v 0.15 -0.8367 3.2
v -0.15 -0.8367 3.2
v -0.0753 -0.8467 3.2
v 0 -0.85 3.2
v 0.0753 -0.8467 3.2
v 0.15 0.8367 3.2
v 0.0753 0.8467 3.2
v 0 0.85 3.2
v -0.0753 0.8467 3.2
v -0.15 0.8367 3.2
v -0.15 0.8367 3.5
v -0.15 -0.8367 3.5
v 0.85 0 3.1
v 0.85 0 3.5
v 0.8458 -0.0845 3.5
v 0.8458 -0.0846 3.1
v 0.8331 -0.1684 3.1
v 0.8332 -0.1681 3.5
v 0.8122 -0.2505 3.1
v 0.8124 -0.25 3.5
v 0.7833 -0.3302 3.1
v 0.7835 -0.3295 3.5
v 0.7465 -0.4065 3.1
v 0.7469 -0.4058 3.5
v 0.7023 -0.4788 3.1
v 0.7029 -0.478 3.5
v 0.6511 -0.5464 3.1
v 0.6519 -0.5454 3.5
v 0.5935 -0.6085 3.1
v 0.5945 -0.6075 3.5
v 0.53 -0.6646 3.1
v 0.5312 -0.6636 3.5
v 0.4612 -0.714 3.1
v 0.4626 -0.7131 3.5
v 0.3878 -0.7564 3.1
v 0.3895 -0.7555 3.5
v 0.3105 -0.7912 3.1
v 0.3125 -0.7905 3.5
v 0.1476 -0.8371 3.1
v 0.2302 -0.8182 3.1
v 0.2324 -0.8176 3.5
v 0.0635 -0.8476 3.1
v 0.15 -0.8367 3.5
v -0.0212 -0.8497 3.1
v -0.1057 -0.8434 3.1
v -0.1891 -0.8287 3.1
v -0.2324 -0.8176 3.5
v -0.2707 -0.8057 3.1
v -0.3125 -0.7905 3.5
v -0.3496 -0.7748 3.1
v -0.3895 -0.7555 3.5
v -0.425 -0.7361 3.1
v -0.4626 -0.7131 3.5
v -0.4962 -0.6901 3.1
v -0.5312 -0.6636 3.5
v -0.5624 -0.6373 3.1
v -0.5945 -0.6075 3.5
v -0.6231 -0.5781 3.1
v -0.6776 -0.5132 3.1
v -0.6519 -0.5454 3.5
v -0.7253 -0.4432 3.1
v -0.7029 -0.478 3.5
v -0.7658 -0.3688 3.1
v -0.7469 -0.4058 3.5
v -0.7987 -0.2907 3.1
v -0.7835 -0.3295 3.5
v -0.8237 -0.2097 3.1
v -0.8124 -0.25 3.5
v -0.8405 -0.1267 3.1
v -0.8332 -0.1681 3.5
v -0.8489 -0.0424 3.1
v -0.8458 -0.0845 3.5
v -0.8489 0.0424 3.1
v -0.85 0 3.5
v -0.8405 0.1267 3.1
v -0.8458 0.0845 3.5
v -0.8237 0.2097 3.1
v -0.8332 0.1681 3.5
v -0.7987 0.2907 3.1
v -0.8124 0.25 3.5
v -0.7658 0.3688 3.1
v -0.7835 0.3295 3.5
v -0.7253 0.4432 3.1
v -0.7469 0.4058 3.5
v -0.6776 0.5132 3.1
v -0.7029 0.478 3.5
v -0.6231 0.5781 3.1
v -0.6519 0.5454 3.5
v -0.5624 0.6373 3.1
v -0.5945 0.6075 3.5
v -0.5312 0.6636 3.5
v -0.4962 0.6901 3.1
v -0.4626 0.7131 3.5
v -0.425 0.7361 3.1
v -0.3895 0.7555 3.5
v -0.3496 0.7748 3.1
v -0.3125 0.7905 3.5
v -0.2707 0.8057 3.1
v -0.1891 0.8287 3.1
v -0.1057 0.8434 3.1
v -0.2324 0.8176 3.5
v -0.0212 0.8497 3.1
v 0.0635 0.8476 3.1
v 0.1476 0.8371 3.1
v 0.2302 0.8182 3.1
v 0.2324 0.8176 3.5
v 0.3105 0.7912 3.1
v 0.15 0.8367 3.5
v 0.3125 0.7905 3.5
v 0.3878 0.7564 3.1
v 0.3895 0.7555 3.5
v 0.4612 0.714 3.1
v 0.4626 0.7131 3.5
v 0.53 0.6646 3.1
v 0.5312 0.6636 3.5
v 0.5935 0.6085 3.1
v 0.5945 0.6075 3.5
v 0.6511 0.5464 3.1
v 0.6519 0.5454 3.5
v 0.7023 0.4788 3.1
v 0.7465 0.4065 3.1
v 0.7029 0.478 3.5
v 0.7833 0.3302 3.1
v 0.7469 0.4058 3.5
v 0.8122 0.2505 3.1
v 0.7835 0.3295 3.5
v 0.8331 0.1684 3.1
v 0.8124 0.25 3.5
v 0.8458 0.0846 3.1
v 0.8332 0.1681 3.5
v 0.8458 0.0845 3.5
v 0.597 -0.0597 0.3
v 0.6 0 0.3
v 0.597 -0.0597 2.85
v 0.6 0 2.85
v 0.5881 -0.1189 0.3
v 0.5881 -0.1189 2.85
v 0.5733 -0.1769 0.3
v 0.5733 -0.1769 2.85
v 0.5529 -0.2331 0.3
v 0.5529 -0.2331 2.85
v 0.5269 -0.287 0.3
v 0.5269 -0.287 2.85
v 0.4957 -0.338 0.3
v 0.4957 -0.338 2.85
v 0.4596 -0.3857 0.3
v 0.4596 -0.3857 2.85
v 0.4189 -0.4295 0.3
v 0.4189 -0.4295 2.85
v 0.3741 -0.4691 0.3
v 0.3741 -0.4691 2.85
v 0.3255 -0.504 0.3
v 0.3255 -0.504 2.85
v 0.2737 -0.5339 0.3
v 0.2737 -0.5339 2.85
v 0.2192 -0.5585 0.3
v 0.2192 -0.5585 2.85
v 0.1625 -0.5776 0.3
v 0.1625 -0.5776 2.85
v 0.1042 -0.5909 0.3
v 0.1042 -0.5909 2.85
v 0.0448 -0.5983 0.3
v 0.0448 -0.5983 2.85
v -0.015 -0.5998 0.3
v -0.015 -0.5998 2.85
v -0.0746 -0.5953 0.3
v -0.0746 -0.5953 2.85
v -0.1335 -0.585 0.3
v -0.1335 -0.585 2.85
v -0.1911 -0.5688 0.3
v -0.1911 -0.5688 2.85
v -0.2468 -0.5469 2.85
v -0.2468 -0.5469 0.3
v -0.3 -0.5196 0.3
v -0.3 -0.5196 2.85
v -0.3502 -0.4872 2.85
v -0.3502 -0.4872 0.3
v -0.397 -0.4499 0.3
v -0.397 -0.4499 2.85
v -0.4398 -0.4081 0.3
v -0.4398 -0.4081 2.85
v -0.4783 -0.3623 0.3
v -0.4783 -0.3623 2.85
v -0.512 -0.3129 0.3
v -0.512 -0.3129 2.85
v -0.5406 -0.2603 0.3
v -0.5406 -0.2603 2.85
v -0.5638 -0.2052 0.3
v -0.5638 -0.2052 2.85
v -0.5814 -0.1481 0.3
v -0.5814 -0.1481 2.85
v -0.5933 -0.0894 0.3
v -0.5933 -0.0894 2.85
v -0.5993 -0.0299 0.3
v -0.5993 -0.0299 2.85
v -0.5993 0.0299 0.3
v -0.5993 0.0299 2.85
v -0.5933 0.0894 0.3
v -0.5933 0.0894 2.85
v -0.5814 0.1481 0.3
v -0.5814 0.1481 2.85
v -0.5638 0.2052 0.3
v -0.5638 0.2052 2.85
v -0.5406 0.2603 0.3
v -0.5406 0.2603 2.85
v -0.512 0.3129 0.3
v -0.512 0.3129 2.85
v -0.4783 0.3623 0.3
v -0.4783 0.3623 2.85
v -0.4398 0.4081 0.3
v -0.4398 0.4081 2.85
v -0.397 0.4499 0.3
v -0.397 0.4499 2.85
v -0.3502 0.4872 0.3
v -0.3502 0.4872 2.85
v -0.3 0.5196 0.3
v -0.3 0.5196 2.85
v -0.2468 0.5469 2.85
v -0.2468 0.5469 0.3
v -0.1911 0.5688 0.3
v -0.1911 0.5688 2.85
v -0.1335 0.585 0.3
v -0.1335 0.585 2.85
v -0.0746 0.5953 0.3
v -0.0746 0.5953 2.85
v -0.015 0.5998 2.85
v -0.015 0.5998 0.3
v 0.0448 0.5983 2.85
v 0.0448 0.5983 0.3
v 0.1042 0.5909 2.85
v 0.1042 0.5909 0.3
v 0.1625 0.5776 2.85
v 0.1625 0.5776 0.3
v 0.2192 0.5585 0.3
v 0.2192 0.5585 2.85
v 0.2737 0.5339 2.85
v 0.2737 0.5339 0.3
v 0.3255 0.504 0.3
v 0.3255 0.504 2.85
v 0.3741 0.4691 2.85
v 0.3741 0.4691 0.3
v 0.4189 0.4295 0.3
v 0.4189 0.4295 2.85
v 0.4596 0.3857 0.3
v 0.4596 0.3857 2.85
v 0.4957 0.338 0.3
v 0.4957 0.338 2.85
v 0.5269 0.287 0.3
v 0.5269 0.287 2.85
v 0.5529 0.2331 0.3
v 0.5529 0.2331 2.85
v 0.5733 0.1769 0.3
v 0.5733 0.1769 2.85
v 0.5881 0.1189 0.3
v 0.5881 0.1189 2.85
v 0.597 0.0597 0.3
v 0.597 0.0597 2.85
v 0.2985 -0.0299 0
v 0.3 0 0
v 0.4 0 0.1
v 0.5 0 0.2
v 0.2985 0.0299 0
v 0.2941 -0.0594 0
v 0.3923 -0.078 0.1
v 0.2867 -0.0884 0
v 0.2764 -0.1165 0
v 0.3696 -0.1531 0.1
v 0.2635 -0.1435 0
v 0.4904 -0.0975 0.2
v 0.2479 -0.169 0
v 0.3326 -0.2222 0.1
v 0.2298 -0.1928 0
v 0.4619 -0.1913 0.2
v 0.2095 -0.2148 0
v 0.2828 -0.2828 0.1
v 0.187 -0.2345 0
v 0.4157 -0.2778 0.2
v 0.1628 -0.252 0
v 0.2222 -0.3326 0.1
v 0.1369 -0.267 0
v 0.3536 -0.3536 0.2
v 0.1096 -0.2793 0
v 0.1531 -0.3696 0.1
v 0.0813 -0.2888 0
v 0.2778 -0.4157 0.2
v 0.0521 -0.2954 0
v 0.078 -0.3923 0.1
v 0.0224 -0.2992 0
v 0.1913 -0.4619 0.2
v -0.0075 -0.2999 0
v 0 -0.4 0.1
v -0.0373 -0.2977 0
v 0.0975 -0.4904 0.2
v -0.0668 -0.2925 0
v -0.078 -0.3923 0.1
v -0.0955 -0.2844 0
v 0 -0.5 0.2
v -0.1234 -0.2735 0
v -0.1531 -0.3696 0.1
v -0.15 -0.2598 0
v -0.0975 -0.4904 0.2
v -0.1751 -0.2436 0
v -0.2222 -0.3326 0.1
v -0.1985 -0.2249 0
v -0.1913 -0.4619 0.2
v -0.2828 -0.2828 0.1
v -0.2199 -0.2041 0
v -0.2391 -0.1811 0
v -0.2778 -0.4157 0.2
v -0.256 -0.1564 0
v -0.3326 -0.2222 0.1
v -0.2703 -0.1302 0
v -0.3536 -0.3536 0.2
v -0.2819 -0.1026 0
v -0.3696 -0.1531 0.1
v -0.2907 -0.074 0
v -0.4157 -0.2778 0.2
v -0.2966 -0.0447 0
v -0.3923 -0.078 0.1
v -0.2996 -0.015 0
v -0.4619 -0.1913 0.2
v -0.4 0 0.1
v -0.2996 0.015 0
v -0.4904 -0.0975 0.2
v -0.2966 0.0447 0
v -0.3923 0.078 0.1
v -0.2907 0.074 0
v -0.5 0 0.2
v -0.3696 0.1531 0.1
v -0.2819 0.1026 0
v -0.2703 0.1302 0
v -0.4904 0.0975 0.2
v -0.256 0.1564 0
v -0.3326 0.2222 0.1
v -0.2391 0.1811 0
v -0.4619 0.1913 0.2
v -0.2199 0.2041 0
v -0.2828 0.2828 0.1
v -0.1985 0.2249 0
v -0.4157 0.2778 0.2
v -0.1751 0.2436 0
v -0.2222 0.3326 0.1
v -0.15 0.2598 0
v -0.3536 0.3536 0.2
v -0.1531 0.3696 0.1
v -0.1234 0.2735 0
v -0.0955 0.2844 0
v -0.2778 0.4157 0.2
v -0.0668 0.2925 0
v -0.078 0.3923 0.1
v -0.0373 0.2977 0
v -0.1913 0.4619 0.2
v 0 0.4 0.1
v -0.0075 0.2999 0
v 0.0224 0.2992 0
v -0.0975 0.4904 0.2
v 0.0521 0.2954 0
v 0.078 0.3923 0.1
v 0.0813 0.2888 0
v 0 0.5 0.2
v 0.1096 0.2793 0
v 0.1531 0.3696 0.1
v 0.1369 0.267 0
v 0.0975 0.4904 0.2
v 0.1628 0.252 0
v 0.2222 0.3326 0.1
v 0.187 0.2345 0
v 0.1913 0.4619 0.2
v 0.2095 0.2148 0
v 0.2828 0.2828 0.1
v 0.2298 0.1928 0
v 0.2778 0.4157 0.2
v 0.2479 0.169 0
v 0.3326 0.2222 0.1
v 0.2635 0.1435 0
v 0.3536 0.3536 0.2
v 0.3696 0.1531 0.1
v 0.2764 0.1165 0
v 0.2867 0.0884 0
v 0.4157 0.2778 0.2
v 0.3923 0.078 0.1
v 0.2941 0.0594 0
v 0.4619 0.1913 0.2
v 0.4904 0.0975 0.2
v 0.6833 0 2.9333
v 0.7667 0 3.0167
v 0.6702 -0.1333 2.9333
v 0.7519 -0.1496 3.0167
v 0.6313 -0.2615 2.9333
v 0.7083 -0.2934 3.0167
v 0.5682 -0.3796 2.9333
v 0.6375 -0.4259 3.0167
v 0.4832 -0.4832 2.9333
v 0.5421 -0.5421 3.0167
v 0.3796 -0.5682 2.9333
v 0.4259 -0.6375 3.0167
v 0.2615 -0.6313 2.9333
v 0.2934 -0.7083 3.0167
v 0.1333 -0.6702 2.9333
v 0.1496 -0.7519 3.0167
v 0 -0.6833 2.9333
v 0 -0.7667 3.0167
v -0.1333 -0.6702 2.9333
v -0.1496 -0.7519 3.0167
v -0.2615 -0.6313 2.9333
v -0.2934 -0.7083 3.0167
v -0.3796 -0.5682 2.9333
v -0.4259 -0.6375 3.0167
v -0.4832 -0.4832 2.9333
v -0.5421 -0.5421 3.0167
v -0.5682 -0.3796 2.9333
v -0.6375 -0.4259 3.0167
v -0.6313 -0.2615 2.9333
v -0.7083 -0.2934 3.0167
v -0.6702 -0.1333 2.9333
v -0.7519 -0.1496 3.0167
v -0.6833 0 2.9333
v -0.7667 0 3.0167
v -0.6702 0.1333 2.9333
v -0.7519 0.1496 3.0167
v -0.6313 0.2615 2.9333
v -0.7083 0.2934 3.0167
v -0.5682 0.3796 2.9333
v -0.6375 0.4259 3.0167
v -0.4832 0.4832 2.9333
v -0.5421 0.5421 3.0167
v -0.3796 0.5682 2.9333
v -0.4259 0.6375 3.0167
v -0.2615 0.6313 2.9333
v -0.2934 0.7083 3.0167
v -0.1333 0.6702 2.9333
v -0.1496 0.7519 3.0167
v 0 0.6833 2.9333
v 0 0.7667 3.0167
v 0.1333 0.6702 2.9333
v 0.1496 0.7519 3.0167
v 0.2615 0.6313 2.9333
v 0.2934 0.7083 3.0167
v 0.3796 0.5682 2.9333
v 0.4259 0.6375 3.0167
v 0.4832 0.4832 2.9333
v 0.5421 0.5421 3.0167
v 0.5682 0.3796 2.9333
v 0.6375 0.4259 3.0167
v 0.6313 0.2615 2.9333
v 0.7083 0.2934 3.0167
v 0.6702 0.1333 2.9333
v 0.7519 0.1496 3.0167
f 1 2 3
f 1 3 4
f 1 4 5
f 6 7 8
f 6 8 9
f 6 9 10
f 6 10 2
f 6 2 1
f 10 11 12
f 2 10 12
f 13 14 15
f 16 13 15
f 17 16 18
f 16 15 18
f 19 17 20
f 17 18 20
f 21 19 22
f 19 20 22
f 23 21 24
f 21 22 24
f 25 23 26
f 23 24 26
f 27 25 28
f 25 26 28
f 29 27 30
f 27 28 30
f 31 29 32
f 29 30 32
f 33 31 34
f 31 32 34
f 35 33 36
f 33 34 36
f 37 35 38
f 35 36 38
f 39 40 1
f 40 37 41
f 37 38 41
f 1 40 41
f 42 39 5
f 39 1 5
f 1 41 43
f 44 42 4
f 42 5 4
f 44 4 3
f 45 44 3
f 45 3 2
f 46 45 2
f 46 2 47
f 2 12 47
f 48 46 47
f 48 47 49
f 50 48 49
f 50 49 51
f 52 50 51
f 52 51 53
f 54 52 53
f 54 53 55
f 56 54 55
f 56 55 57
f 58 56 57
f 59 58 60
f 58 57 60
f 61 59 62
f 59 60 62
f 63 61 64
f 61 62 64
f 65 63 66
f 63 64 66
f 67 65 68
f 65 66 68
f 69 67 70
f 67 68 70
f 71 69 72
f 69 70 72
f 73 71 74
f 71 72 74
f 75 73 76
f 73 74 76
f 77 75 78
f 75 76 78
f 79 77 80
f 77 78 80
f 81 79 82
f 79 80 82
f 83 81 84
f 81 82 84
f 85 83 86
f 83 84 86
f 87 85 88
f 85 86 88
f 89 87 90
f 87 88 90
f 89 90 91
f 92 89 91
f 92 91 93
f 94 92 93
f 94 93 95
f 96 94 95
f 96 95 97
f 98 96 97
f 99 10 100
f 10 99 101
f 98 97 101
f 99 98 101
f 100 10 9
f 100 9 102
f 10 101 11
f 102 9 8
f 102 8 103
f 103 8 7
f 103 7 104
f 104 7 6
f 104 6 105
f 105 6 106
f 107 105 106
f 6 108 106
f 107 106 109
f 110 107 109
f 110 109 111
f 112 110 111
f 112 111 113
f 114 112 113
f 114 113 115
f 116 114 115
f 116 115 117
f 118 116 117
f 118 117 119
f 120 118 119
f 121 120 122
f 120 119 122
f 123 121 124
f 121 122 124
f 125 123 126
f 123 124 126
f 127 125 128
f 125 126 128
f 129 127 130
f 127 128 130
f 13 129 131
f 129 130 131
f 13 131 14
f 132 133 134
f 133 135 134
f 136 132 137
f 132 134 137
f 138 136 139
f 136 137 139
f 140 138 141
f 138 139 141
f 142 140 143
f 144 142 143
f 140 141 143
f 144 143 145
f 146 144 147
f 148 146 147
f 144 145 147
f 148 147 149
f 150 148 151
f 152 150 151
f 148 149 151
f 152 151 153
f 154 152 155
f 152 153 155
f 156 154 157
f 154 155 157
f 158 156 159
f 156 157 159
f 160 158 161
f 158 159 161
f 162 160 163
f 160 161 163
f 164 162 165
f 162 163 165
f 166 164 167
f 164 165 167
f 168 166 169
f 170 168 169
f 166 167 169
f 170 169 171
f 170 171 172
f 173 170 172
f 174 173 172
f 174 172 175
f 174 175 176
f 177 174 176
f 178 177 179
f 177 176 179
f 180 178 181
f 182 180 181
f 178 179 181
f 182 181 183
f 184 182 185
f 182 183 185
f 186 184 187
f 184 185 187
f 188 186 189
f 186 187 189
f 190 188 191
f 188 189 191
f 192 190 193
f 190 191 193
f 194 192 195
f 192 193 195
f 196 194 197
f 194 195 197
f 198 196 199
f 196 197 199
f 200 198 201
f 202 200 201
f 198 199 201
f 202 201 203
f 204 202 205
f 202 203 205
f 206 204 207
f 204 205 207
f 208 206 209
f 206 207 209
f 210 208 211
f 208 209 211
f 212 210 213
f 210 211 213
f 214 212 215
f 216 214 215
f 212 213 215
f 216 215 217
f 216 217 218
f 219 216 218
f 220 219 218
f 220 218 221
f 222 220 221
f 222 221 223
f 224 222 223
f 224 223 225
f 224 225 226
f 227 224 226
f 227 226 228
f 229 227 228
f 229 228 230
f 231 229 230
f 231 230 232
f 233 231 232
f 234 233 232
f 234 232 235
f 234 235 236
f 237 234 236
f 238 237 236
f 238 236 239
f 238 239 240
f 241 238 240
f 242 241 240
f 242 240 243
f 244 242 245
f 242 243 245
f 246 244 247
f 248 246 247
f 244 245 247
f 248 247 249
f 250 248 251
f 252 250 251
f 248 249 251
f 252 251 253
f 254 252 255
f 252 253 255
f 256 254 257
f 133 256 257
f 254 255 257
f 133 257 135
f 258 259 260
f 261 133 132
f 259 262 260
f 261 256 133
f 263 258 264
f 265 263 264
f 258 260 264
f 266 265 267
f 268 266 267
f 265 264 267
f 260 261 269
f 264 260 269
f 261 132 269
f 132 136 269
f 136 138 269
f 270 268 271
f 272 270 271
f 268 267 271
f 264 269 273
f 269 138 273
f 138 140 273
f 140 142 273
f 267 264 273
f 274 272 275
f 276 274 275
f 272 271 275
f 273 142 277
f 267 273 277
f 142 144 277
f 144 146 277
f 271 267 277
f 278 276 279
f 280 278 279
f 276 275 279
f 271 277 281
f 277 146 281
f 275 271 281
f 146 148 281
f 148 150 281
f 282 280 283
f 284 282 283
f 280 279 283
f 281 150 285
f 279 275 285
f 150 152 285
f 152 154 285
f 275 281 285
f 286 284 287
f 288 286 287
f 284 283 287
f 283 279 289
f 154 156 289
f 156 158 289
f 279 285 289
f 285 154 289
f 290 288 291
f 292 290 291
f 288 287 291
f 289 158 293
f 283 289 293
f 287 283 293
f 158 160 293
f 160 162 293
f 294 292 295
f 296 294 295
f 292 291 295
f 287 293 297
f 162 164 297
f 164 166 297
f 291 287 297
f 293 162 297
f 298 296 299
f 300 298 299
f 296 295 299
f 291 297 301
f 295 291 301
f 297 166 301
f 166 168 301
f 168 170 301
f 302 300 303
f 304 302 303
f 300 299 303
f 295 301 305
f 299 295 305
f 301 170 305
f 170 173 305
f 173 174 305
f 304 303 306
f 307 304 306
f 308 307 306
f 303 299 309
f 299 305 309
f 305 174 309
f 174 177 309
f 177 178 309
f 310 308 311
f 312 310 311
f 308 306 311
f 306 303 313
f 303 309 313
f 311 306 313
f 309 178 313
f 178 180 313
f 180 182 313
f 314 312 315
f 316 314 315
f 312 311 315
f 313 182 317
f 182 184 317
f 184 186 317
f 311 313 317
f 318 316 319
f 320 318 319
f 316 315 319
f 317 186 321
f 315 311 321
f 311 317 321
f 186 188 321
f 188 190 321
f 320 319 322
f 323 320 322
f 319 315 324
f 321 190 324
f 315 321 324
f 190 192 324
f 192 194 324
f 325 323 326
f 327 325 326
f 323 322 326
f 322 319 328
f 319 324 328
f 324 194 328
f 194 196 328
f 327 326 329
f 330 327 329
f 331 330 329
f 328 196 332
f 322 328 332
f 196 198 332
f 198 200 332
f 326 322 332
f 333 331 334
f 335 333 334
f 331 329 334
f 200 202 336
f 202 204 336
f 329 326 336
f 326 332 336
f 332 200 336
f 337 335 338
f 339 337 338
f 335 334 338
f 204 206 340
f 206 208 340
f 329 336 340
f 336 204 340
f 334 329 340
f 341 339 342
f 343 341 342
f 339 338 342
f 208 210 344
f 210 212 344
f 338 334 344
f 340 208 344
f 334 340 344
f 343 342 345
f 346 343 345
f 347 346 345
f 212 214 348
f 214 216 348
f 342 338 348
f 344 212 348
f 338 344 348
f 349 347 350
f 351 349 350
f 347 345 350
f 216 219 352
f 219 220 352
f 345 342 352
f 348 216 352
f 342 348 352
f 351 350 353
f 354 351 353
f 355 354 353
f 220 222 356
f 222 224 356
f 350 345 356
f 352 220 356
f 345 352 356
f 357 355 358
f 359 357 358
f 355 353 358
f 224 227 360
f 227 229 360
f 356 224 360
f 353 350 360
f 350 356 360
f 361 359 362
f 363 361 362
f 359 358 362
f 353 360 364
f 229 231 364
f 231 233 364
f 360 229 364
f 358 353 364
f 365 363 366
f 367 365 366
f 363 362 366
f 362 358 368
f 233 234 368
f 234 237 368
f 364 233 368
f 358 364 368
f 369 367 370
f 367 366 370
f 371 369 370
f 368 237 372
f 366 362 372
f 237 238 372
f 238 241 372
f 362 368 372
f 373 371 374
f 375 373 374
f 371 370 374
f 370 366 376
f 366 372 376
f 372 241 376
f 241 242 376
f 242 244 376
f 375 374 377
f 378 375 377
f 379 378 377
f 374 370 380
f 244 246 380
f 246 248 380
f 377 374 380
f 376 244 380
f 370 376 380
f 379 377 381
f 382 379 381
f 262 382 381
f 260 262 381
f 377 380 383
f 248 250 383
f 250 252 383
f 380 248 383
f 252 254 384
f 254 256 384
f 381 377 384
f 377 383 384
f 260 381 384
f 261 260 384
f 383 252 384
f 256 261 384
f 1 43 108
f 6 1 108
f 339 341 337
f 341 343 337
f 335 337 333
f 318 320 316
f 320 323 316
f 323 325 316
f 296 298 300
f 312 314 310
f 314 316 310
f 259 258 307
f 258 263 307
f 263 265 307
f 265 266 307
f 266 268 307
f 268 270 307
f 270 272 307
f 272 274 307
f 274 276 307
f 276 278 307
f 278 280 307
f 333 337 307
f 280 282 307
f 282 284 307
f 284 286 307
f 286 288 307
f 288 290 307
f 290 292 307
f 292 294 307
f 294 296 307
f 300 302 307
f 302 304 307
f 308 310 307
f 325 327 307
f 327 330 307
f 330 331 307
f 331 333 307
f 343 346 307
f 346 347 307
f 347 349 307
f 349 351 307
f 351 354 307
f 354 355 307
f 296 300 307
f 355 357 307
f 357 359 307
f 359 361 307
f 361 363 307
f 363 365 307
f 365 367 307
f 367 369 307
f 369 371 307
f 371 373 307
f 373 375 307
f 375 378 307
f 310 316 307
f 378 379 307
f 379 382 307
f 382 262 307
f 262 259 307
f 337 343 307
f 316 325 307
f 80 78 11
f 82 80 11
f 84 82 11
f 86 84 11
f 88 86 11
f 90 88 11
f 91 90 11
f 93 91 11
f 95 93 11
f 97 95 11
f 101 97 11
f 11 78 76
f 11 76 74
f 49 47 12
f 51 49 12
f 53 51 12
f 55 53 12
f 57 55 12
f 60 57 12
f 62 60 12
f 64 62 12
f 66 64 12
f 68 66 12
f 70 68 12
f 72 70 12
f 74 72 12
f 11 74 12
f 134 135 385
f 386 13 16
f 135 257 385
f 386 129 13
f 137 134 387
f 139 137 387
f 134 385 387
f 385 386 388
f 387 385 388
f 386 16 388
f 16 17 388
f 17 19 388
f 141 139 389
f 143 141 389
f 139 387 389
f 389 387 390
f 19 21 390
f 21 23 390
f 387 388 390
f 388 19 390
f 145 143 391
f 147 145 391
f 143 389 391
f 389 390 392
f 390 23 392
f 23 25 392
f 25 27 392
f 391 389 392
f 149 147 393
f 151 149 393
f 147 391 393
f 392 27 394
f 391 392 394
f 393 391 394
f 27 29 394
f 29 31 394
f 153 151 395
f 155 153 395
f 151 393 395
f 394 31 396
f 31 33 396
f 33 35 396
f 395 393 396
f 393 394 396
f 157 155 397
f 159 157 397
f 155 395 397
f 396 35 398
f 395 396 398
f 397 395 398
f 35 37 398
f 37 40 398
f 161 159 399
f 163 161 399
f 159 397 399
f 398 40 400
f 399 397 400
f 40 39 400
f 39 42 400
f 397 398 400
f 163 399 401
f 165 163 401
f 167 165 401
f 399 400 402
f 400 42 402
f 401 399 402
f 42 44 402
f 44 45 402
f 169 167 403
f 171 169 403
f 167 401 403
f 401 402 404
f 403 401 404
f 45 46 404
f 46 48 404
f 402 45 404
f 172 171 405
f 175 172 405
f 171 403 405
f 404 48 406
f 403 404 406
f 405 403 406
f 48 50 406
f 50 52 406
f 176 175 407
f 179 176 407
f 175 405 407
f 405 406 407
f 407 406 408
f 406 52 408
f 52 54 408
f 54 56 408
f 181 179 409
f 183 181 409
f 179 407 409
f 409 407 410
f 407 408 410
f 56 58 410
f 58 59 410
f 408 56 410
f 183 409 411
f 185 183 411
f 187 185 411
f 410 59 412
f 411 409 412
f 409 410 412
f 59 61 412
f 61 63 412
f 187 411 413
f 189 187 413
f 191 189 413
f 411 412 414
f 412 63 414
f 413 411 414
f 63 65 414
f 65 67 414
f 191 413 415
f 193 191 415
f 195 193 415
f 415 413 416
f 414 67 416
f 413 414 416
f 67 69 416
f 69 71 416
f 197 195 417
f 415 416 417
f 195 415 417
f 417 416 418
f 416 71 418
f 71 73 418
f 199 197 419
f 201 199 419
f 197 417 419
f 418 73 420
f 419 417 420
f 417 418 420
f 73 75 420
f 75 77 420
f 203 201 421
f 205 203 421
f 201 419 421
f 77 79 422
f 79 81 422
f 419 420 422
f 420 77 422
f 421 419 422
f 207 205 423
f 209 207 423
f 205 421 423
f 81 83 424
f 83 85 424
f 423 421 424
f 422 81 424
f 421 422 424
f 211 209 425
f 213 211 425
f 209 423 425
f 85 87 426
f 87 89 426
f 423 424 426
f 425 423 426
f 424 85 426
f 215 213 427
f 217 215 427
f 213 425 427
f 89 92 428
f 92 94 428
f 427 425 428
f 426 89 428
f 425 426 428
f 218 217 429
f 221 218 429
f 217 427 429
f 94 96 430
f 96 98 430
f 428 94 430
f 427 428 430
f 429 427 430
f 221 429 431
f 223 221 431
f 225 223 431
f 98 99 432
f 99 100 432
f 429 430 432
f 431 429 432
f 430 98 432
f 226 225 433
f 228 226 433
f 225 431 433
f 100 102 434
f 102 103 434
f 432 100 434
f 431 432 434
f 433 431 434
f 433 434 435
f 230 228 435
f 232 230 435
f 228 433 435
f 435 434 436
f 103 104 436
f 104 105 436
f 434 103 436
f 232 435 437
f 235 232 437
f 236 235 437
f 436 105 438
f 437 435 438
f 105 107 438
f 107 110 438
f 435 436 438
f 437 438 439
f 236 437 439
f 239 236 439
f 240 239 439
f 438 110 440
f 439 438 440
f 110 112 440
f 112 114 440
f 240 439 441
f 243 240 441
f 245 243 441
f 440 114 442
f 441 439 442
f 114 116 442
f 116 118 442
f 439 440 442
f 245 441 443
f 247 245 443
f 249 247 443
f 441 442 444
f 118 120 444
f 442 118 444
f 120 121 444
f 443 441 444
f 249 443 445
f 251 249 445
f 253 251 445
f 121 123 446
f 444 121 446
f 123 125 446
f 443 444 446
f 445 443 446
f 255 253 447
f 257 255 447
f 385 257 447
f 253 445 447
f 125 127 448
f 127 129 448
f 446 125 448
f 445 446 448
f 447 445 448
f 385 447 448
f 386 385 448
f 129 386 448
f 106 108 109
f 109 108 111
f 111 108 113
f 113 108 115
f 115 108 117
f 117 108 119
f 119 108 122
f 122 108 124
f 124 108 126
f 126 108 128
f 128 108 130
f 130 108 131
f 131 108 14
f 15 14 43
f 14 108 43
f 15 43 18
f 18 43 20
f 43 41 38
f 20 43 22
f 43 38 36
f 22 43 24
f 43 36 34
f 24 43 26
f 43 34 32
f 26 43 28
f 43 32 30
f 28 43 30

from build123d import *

# Parameters (mm, degrees)
F3_DEPTH = 0.3


with BuildPart() as f1:
    # F0 (on Front) → F1 (revolve)
    with BuildSketch(Plane.XZ):
        Polygon((0, 3.5), (0, 0), (0.3, 0), (0.6, 0.3), (0.6, 2.85), (0.85, 3.1), (0.85, 3.5), align=None)
    revolve(axis=Axis((0, 0, 1.75), (0, 0, -1)))

    # F2 (on face) → F3 (cut)
    with BuildSketch(Plane.XY.offset(3.5)):
        with BuildLine():
            ThreePointArc((0.15, 0.83666), (0, 0.85), (-0.15, 0.83666))
            Line((-0.15, 0.83666), (-0.15, -0.83666))
            ThreePointArc((-0.15, -0.83666), (0, -0.85), (0.15, -0.83666))
            Line((0.15, -0.83666), (0.15, 0.83666))
        make_face()
    extrude(amount=-F3_DEPTH, mode=Mode.SUBTRACT)


solid = f1.part
